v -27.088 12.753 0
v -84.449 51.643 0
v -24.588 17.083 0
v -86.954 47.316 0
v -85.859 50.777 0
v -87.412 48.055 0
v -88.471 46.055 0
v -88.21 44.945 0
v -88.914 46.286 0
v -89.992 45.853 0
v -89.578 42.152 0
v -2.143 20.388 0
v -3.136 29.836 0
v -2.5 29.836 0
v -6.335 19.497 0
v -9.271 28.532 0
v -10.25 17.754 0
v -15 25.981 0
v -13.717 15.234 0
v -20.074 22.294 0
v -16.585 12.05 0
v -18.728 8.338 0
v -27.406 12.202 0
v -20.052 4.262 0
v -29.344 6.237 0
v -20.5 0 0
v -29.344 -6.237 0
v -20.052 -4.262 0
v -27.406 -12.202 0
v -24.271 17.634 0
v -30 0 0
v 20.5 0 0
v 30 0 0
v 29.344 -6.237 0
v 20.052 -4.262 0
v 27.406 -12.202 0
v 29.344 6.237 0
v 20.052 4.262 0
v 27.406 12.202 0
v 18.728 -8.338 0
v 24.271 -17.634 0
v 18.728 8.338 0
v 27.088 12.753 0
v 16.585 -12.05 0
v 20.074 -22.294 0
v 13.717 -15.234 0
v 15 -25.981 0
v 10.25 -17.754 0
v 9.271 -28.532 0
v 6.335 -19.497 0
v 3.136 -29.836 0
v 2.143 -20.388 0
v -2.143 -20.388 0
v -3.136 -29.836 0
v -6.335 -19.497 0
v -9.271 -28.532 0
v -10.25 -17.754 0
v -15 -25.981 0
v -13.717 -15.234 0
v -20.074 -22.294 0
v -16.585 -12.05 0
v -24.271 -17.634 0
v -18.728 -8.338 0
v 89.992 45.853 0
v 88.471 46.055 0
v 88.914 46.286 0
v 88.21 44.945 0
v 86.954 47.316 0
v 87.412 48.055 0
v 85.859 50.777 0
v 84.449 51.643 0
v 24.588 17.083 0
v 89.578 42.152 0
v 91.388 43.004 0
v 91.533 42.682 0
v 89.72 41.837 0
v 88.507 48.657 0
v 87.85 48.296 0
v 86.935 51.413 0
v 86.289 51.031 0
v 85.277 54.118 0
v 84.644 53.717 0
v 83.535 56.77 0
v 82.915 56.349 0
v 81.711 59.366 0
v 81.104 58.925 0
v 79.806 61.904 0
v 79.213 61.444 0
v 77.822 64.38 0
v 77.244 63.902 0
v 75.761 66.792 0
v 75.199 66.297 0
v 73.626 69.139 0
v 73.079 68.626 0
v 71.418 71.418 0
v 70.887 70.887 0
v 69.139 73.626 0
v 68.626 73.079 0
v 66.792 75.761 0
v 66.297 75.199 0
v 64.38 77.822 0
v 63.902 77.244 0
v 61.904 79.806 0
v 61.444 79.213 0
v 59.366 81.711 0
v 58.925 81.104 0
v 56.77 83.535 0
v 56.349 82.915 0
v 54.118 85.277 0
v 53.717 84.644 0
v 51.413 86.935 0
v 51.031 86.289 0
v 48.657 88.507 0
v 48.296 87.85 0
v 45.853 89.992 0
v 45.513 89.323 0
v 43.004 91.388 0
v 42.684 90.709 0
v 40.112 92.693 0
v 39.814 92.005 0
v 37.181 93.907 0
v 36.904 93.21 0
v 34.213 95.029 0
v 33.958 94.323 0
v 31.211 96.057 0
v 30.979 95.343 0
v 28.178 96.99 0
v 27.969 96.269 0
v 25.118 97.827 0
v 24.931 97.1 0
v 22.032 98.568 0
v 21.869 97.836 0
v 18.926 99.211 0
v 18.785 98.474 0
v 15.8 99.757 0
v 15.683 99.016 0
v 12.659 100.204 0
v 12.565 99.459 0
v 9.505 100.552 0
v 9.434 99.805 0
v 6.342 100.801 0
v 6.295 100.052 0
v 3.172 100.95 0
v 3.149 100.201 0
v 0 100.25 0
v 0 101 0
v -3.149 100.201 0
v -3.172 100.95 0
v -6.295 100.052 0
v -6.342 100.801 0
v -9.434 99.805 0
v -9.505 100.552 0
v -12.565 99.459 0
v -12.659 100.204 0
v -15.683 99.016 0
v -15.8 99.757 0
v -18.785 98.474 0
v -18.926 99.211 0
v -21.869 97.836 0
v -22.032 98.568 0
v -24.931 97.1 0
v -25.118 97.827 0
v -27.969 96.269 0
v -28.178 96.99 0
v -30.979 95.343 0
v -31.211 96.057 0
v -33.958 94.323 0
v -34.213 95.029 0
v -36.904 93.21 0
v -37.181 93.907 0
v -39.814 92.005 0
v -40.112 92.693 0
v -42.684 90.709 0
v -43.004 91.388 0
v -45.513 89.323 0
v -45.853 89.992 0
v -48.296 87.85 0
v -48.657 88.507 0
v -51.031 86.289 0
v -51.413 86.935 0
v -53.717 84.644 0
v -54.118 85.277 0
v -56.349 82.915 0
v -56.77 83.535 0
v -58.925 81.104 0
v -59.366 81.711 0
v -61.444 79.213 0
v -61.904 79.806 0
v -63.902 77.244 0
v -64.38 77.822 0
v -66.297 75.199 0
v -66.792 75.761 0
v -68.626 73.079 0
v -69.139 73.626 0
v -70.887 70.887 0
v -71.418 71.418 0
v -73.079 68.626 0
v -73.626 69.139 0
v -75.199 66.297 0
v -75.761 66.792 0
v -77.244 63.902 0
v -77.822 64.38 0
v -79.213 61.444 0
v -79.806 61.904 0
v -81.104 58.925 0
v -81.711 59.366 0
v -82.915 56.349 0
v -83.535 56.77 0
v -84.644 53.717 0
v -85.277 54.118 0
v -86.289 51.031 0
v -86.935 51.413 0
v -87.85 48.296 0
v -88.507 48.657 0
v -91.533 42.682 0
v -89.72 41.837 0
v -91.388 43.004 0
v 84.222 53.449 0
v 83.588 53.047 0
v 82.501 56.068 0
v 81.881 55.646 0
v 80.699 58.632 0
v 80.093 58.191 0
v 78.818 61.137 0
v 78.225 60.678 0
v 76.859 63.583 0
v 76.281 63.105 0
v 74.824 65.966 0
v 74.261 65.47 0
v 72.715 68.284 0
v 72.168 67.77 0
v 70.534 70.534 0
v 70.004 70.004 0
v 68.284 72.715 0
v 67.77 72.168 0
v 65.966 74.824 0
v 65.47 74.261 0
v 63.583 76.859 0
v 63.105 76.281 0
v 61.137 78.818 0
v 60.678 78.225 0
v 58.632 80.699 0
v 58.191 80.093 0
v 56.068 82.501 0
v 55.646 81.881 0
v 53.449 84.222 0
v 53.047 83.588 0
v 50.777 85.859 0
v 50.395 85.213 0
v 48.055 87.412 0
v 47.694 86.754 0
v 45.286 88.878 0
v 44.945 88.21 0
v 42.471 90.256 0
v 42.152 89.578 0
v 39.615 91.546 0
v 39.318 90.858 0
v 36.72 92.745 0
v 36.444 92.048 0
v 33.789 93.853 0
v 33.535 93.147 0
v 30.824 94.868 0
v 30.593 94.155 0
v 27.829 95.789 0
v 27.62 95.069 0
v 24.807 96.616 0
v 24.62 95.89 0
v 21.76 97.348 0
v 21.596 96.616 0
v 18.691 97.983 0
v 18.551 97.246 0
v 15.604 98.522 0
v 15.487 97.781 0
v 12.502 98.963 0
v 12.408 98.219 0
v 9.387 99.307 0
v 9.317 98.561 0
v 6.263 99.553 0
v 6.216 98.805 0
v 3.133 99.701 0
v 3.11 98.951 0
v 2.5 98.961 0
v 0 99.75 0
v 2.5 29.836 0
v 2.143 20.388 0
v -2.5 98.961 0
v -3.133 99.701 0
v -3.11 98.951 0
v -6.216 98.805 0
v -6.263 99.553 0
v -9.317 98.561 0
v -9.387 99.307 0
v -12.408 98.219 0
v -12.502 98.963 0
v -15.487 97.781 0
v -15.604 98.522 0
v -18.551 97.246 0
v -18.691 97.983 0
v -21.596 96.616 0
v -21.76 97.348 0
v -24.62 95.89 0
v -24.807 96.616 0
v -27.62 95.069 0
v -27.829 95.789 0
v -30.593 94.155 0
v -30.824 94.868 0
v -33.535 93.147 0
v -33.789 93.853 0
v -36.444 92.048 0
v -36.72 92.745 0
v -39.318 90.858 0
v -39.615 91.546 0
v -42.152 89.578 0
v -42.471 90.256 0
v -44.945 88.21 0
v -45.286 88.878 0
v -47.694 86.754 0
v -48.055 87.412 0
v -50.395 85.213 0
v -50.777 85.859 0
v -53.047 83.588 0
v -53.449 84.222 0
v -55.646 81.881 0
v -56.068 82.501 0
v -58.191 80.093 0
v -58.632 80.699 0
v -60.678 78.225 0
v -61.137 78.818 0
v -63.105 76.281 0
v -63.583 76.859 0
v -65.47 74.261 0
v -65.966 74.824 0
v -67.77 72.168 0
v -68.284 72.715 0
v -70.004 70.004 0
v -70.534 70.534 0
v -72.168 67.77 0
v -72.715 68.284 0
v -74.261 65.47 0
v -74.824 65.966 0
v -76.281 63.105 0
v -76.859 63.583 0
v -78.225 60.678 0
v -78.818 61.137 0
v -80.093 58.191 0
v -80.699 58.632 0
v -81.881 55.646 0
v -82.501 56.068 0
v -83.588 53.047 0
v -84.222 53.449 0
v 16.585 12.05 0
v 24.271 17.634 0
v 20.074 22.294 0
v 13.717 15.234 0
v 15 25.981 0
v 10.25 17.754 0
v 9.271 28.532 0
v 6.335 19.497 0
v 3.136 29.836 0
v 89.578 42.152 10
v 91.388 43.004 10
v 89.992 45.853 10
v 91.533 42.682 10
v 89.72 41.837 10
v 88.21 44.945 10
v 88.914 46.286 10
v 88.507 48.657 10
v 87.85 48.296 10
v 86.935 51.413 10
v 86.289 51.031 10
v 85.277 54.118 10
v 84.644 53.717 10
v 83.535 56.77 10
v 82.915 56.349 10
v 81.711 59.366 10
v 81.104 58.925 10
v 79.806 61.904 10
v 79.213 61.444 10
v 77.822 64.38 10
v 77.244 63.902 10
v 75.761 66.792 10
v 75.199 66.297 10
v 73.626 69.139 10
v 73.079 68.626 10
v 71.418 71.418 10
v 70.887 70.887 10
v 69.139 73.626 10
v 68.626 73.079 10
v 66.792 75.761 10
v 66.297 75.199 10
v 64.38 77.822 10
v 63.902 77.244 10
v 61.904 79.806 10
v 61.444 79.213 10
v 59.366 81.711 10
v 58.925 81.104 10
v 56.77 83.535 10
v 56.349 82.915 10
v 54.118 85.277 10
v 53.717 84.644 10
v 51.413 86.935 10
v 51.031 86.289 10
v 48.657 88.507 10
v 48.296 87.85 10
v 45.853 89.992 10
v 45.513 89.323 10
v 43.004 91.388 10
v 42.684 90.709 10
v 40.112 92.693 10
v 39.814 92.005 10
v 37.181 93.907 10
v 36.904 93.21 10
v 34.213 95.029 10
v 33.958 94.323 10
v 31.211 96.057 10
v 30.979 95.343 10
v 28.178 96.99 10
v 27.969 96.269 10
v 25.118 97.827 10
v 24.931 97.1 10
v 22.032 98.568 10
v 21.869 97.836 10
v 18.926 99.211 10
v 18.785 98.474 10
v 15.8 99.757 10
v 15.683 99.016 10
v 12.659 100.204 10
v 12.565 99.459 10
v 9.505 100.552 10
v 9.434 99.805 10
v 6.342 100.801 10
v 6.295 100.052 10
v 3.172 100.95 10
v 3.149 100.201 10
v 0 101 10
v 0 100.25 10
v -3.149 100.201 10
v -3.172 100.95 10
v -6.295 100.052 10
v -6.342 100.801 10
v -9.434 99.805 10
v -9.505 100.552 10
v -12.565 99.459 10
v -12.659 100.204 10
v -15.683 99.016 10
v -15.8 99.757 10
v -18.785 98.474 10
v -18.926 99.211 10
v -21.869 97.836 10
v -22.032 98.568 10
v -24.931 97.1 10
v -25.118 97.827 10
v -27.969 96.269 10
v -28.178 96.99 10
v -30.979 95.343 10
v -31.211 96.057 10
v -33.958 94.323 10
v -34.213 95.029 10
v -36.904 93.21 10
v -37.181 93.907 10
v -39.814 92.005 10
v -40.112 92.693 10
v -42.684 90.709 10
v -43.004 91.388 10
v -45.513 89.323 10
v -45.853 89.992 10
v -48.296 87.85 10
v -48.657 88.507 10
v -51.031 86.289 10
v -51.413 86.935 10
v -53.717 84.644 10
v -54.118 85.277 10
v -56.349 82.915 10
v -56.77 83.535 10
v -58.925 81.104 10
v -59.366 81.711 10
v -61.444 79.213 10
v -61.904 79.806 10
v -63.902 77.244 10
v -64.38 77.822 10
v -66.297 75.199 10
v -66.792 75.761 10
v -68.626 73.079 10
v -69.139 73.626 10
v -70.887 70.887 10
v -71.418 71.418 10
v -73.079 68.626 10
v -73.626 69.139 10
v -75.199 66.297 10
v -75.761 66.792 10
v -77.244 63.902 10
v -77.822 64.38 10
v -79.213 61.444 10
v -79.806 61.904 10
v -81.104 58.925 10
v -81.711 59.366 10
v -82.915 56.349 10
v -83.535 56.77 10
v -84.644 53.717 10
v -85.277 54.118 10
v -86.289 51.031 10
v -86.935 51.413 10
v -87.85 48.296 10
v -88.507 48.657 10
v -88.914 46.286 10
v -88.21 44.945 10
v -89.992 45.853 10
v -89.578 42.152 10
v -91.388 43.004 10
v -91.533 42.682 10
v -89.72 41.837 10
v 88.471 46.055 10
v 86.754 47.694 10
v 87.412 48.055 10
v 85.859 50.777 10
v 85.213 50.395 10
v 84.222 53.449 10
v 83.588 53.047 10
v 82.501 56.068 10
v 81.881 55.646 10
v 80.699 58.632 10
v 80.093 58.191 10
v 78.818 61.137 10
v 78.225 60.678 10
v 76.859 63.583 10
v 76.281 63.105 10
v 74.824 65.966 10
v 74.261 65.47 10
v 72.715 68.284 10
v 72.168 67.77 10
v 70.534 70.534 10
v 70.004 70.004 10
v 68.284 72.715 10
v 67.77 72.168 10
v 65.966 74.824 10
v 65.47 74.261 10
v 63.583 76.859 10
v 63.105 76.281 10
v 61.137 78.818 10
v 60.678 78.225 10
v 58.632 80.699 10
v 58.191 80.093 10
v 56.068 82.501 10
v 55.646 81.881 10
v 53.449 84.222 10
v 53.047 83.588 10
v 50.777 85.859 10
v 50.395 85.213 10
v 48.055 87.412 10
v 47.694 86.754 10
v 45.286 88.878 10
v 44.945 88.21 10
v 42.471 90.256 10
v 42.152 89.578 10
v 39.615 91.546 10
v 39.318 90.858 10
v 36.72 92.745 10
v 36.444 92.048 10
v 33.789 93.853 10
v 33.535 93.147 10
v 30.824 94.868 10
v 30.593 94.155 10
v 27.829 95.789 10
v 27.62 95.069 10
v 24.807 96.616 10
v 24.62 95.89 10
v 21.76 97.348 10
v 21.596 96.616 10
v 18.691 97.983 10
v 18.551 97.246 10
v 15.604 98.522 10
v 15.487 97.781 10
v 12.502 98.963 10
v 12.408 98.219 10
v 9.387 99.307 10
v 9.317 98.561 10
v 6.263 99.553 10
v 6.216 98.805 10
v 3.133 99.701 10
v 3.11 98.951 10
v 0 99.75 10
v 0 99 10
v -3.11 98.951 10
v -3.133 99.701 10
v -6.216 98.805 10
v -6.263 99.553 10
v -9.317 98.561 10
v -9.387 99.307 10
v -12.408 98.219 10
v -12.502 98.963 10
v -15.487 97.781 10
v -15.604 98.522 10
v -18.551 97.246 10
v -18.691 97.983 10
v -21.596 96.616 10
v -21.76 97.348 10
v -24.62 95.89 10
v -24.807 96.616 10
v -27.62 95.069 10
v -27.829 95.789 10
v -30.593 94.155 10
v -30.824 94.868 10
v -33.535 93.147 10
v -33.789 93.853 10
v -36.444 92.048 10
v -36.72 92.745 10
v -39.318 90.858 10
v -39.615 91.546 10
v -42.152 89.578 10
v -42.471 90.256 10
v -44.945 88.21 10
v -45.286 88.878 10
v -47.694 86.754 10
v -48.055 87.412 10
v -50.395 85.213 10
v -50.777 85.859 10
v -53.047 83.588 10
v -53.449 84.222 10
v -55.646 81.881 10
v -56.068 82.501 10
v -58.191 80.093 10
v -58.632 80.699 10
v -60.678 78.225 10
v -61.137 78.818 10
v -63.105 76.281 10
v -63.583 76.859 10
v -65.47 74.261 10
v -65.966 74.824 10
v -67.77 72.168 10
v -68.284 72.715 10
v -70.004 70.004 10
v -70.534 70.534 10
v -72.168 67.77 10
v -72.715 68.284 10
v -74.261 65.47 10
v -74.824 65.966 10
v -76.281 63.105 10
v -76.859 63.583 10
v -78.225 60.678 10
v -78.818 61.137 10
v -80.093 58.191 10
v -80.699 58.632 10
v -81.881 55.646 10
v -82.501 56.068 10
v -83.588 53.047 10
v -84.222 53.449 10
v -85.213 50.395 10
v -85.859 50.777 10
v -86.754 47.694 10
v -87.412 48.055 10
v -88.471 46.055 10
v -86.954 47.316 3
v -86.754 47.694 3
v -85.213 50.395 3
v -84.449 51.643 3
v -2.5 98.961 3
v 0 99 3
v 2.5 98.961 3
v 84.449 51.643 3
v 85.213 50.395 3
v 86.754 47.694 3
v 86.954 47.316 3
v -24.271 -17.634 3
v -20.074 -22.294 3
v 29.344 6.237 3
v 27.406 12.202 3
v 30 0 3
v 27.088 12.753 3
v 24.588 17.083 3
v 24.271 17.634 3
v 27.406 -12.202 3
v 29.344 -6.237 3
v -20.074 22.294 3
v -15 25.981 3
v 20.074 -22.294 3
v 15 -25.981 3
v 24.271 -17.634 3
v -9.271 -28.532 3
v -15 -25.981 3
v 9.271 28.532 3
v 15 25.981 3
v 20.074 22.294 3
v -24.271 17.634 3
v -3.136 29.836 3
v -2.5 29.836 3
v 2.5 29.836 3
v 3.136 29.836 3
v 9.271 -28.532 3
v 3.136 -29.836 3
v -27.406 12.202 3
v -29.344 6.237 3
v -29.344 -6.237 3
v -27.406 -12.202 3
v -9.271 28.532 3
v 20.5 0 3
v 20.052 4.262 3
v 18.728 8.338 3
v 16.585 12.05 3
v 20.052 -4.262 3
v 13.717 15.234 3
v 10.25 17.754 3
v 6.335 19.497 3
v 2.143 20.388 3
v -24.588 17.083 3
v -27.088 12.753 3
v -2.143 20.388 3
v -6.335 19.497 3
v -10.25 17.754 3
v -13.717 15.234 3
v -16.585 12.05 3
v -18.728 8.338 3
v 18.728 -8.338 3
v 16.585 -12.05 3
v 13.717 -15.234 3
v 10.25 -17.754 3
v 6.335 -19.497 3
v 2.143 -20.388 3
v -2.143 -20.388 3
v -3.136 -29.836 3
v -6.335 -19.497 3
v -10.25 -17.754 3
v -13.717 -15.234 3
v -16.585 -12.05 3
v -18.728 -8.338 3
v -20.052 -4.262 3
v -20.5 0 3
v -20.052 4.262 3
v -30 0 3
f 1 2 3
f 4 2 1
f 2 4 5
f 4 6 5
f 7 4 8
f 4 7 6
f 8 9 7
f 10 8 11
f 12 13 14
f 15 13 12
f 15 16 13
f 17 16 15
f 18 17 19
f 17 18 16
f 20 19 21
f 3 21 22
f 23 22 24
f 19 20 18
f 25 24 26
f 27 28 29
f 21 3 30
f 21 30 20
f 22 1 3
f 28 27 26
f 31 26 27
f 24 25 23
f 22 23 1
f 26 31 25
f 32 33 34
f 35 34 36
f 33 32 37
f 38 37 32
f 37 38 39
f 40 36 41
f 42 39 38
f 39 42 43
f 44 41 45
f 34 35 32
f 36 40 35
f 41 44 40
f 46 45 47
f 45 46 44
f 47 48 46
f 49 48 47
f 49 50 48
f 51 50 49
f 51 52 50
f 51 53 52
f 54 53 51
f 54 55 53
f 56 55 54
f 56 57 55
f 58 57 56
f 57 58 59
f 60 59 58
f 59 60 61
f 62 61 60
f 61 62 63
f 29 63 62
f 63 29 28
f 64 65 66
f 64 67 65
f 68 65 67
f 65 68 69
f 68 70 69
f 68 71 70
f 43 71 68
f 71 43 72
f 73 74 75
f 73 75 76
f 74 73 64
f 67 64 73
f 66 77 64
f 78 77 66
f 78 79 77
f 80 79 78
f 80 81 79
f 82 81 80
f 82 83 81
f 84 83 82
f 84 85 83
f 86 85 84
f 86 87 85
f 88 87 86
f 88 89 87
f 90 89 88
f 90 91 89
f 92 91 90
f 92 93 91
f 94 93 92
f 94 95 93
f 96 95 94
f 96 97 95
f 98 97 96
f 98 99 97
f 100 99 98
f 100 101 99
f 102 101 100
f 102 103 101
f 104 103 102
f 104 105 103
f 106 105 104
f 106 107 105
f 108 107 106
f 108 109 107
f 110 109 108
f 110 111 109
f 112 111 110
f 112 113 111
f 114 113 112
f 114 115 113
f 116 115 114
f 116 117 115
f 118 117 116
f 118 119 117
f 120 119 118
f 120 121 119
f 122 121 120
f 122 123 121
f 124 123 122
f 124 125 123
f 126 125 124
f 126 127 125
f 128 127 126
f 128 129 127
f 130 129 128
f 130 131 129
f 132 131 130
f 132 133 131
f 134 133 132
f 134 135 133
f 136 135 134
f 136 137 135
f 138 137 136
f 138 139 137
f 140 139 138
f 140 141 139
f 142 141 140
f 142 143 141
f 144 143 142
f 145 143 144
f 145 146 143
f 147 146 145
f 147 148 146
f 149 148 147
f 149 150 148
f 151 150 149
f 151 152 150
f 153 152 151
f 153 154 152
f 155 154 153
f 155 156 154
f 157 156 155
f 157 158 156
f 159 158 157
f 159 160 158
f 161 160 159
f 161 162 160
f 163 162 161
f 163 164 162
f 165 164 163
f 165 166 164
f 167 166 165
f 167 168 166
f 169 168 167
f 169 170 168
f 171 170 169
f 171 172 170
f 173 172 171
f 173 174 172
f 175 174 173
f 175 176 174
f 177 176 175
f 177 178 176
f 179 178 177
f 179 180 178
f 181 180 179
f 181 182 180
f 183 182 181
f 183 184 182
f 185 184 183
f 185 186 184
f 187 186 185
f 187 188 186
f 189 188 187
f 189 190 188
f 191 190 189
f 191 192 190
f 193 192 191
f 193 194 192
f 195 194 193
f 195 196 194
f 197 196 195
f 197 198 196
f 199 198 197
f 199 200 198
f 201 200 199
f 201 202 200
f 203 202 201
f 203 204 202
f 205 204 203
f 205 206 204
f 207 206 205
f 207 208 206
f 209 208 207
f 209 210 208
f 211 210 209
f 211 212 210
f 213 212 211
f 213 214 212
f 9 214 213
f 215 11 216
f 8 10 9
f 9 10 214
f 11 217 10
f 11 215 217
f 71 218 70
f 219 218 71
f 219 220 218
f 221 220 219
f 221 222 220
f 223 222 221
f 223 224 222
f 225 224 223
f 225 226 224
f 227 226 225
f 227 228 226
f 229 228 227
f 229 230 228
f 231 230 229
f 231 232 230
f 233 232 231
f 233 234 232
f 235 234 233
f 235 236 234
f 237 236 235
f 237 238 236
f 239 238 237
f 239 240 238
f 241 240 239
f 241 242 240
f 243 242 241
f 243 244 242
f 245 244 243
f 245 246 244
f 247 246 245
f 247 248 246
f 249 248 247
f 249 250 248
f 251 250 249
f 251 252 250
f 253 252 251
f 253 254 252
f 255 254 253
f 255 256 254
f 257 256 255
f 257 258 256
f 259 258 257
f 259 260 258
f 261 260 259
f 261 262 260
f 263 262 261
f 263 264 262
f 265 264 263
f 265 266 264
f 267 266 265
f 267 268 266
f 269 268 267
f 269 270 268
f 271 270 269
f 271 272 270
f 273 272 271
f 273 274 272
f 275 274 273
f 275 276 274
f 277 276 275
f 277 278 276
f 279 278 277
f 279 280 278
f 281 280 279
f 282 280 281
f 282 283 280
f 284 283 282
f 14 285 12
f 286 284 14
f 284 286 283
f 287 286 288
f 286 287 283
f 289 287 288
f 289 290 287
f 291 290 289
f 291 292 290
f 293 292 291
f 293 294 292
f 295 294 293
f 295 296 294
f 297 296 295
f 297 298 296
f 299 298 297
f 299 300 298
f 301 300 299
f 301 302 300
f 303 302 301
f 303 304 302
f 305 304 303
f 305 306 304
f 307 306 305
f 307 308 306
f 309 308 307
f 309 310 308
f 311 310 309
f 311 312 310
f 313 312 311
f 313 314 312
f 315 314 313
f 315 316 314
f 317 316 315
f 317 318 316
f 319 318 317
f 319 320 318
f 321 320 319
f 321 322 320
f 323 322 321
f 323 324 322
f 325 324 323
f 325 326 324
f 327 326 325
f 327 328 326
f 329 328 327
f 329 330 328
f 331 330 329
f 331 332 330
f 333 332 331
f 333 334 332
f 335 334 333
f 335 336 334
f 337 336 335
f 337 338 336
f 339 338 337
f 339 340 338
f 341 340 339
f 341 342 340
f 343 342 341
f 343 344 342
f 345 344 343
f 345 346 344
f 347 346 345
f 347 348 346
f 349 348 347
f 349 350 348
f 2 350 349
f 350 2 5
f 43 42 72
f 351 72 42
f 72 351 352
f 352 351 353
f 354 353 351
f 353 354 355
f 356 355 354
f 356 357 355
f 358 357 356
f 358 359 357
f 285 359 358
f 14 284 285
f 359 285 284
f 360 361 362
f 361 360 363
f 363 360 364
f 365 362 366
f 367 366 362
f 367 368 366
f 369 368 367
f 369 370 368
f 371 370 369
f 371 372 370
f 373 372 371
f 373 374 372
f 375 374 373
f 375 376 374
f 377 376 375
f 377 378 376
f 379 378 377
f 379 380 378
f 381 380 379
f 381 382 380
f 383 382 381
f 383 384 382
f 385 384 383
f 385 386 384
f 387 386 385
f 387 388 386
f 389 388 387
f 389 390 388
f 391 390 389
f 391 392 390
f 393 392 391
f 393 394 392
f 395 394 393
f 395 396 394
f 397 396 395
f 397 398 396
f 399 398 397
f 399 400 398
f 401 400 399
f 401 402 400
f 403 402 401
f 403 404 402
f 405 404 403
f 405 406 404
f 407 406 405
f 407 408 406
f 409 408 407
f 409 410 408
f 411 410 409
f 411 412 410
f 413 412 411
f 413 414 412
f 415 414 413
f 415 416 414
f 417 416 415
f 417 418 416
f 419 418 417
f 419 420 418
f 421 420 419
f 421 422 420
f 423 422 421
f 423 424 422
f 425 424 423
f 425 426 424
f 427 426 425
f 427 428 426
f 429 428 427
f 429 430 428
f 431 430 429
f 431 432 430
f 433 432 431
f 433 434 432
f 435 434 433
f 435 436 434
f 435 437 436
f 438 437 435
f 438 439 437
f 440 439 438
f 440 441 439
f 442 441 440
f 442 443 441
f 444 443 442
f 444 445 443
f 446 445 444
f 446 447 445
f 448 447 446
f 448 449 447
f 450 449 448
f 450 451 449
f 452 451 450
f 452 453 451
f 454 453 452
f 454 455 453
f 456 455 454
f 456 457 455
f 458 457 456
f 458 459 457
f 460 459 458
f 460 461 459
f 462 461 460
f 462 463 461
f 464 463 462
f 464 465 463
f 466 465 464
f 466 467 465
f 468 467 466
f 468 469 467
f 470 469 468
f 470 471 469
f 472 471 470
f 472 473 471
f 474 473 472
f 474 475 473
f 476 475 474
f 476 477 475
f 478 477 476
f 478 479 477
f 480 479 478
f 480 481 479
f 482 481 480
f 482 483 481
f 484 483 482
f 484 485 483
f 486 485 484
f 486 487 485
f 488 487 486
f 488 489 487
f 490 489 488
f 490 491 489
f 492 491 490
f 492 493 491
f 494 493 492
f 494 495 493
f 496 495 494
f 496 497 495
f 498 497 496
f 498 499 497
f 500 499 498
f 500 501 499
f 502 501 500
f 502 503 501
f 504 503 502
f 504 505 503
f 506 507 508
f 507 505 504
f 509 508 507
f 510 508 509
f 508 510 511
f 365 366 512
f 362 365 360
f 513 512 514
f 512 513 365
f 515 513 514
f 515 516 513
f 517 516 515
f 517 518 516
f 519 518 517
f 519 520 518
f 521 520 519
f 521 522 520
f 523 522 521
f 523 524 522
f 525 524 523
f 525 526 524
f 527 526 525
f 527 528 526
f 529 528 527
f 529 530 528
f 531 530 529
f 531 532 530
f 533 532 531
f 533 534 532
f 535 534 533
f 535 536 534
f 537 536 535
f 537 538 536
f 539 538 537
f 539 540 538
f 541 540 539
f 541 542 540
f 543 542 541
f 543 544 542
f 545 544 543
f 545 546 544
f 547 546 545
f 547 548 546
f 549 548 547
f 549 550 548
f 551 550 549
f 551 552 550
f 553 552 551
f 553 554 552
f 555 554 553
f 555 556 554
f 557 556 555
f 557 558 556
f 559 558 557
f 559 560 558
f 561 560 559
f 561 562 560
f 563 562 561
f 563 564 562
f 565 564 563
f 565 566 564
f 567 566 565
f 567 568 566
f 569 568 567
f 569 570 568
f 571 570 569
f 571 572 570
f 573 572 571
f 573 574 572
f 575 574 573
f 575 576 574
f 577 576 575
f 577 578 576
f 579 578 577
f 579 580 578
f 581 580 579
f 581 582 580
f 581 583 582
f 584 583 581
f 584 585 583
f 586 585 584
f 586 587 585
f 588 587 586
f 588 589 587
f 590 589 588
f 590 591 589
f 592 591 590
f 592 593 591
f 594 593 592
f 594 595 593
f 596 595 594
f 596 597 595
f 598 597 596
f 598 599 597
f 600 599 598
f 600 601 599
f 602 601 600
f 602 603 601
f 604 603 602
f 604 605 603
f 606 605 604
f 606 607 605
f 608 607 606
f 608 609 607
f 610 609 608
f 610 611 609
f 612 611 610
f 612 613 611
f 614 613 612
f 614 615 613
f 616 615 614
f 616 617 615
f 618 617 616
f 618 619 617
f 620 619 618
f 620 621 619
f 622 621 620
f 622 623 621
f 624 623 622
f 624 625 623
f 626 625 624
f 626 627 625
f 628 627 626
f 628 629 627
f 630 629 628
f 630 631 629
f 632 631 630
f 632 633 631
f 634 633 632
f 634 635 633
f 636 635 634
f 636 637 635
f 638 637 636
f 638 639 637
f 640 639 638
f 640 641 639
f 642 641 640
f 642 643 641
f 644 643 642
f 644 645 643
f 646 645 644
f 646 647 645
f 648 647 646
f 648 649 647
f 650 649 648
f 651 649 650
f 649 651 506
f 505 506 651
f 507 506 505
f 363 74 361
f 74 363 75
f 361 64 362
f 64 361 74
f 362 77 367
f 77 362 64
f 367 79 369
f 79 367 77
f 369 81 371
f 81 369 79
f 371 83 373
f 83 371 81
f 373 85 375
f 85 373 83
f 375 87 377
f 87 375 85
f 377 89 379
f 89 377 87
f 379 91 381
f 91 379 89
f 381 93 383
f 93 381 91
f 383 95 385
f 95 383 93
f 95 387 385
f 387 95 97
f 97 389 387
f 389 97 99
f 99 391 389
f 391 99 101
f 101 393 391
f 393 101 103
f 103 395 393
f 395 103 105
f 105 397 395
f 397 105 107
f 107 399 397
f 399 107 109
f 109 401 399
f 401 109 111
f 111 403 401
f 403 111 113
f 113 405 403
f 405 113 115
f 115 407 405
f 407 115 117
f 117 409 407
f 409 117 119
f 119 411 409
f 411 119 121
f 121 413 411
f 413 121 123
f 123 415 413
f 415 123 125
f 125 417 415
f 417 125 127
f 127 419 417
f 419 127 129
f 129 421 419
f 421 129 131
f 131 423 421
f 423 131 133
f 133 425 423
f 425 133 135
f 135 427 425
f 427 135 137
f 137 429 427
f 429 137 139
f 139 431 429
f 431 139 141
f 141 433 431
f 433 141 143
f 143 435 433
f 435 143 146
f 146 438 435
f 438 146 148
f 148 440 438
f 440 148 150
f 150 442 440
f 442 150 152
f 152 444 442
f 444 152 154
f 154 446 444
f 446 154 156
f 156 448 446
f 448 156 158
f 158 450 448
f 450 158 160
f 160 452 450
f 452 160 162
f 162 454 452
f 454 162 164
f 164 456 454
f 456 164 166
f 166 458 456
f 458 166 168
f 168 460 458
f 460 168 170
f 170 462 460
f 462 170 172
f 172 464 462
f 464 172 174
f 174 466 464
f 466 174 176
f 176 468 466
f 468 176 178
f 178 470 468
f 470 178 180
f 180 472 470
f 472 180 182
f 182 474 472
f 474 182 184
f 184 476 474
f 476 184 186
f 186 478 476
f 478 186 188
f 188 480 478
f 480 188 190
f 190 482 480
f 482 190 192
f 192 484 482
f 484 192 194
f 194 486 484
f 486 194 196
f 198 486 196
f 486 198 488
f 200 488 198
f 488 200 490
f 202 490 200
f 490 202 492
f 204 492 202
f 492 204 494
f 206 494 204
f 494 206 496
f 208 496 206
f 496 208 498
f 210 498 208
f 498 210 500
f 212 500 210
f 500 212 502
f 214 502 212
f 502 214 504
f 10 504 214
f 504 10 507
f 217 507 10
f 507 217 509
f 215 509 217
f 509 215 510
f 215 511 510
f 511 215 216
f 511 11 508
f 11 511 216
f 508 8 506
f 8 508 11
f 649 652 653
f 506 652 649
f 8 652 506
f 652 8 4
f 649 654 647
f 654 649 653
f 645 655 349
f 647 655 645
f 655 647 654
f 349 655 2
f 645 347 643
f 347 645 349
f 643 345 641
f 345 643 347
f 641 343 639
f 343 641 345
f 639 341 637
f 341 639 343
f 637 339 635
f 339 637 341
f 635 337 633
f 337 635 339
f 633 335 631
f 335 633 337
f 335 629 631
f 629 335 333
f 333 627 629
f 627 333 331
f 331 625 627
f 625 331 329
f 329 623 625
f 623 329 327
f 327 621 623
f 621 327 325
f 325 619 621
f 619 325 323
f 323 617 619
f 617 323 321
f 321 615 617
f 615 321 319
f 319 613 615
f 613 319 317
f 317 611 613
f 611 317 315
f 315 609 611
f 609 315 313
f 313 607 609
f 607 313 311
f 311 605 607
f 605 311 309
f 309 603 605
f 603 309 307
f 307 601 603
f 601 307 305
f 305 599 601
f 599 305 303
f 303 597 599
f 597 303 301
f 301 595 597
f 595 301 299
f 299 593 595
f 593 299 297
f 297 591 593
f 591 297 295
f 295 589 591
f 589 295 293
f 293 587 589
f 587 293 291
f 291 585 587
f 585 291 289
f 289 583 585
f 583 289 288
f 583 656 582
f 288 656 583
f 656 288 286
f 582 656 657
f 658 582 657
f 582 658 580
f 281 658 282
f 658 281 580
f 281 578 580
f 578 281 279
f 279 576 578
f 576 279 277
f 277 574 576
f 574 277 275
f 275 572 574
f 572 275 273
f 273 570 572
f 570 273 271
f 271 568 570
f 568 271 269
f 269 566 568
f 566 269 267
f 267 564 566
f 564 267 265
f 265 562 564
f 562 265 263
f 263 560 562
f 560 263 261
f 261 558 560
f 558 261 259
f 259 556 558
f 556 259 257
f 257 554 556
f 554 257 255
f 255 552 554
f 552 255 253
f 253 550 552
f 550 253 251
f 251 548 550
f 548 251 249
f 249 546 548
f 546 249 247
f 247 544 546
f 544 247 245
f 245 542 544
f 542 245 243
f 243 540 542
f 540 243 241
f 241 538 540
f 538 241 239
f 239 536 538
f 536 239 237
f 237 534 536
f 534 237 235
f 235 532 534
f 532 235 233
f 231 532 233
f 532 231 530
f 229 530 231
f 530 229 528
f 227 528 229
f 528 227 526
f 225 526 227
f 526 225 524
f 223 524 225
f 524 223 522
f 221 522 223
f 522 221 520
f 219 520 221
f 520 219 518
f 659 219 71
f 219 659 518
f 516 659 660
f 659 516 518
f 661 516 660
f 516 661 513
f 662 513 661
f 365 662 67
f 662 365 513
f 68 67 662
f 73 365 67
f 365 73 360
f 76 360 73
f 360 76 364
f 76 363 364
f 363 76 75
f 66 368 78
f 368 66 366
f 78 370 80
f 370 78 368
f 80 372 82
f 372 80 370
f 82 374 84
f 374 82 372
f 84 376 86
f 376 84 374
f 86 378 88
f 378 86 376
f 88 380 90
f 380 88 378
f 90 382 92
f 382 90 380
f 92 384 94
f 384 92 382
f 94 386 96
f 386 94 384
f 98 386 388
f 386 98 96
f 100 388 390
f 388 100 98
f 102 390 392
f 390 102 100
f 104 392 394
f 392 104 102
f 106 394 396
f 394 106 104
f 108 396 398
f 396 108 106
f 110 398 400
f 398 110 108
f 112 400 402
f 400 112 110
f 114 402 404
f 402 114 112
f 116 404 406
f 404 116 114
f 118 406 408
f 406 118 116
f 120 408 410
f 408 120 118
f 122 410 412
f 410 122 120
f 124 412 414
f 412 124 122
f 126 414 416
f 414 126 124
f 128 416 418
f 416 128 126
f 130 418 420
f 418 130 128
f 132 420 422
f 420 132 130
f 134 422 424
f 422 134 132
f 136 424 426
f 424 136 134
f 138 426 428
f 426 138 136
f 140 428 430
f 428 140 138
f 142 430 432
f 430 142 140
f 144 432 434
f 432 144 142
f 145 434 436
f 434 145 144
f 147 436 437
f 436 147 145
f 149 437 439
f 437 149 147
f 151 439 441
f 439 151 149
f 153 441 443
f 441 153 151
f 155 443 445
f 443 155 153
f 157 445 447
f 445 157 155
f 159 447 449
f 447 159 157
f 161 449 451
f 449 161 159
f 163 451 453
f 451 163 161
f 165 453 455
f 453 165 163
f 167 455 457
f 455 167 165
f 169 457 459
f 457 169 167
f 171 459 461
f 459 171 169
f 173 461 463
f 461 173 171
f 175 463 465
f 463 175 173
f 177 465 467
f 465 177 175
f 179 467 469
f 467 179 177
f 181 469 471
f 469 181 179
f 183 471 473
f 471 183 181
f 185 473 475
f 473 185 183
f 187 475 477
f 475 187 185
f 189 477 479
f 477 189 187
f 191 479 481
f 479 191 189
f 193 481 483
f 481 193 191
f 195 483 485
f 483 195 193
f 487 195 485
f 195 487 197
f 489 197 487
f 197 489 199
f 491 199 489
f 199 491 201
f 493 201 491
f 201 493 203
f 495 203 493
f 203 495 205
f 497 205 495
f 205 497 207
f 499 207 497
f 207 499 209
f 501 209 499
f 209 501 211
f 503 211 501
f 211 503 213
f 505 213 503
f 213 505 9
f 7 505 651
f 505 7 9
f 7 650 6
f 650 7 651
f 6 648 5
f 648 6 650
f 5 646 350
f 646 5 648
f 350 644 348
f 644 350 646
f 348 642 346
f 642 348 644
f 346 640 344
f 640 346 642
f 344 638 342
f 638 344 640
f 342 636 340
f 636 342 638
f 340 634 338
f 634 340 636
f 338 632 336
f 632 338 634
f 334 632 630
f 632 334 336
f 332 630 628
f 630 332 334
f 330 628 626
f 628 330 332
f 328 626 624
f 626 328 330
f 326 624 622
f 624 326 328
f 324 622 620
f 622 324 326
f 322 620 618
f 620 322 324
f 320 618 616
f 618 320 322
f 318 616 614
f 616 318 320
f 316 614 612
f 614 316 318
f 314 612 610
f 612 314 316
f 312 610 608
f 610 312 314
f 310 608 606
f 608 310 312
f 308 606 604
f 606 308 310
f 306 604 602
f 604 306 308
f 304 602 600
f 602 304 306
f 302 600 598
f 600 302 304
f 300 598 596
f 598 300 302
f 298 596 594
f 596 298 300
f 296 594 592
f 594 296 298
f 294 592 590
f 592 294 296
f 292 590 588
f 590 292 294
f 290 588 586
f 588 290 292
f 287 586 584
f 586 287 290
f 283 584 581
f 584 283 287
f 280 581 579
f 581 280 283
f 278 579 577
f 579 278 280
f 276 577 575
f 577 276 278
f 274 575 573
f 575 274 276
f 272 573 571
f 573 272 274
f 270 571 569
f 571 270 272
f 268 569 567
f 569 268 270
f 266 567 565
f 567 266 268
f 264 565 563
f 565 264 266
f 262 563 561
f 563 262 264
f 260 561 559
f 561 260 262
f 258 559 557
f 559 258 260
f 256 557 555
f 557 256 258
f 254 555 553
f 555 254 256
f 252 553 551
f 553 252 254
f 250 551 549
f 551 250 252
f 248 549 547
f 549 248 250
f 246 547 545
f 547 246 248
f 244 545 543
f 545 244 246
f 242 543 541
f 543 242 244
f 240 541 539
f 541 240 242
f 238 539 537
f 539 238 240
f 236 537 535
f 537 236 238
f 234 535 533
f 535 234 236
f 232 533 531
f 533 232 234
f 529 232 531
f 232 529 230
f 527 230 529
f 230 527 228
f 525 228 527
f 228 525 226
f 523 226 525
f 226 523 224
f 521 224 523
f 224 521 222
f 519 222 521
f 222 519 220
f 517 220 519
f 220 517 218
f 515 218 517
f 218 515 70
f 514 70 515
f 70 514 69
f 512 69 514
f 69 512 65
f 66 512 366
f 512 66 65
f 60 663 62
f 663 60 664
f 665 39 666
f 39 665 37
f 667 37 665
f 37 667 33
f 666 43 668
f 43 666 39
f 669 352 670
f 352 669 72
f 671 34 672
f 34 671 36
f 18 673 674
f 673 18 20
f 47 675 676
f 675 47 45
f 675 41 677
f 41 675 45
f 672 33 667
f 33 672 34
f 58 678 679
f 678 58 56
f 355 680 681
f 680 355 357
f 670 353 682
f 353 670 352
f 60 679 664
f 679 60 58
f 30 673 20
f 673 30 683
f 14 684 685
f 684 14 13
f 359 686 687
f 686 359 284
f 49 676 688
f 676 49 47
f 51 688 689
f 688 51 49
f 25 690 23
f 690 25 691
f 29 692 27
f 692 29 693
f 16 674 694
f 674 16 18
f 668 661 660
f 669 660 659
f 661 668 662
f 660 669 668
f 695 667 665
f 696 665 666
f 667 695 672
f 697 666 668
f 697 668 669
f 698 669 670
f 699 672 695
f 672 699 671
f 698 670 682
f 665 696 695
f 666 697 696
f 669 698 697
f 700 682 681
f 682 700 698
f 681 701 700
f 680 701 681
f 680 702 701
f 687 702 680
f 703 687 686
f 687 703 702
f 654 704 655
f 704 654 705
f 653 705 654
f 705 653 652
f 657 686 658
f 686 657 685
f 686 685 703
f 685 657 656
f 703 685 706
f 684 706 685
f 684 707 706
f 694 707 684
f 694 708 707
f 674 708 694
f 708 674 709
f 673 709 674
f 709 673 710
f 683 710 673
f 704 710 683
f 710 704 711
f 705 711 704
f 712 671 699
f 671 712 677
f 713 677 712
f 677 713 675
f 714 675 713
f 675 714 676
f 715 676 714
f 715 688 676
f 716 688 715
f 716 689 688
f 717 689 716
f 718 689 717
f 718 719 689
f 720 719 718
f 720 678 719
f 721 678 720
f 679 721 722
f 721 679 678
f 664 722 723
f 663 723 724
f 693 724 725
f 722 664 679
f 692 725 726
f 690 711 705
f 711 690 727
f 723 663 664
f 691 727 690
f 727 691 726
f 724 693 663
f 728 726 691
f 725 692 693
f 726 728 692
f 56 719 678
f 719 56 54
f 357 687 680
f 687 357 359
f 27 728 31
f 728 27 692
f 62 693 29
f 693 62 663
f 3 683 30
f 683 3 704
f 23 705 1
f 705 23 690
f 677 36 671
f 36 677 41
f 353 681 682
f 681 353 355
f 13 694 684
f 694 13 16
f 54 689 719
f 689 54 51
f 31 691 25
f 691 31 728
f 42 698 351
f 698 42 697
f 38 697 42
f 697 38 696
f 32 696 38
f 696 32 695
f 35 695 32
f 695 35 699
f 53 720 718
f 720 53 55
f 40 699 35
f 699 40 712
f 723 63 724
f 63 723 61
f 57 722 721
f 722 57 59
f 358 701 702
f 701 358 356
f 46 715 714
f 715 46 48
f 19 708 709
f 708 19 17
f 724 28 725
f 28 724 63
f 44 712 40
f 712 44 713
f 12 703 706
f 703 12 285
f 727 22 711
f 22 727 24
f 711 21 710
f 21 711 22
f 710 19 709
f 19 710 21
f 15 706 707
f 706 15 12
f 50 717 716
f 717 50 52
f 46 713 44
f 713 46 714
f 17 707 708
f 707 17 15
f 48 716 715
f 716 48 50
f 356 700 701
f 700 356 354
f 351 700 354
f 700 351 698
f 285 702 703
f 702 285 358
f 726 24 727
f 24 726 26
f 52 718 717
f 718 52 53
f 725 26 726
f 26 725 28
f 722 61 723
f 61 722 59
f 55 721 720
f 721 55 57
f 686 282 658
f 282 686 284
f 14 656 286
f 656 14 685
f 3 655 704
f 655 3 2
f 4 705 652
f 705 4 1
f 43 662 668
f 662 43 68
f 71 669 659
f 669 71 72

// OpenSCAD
// file: arc.scad
/*
Plot a 2D or 3D arc from 0.1 to ~358 degrees.

Set Width of drawn arc, Radius, Thickness, resolution ($fn) and height for the 3D arc. Arc is centered around the origin

By tony@think3dprint3d.com
GPLv3

*/

2D_arc(w=10,r=20,deg=270,fn=200);

module 2D_arc(w, r, deg=90,fn = 100 ) {
	render() {
		difference() {
			// outer circle
			circle(r=r+w/2,center=true,$fn=fn);
			// outer circle
			circle(r=r-w/2,center=true,$fn=fn);

		//remove the areas not covered by the arc
		translate([sin(90-deg/2)*((r+w/2)*2),
						-sin(deg/2)*((r+w/2)*2)])
			rotate([0,0,90-deg/2])
				translate([((r+w/2))-sin(90-(deg)/4)*((r+w/2)),
							((r+w/2))*2-sin(90-(deg)/4)*((r+w/2))])
					square([sin(90-deg/4)*((r+w/2)*2),
								sin(90-deg/4)*((r+w/2)*2)],center=true);
		translate([-sin(90-(deg)/2)*((r+w/2)*2),
						-sin(deg/2)*((r+w/2)*2)])
			rotate([0,0,-(90-deg/2)])
			  translate([-((r+w/2))+sin(90-(deg)/4)*((r+w/2)),
							((r+w/2))*2-sin(90-(deg)/4)*((r+w/2))])
					square([sin(90-deg/4)*((r+w/2)*2),
								sin(90-deg/4)*((r+w/2)*2)],center=true);
		}
		//line to see the arc
		//#translate([-((r)*2)/2, sin((180-deg)/2)*(r)]) square([(r+w/2)*2+1,0.01]); 
	}
}

module 3D_arc(w, r, deg, h,fn) {
	linear_extrude(h)
			2D_arc(w, r, deg,fn);

}
// main file
use <arc.scad>;
difference() {
3D_arc(h=10,w=2,r=100,deg=130,fn=200);
3D_arc(h=10,w=0.5,r=100,deg=125,fn=200);
}
difference() {
    cylinder(h=3, d=60);
    cylinder(h=3, d=41);
}

translate([-2.5,25,0])cube([5,74,3],false);
rotate([0,0,60])translate([-2.5,25,0])cube([5,74,3],false);
rotate([0,0,-60])translate([-2.5,25,0])cube([5,74,3],false);
